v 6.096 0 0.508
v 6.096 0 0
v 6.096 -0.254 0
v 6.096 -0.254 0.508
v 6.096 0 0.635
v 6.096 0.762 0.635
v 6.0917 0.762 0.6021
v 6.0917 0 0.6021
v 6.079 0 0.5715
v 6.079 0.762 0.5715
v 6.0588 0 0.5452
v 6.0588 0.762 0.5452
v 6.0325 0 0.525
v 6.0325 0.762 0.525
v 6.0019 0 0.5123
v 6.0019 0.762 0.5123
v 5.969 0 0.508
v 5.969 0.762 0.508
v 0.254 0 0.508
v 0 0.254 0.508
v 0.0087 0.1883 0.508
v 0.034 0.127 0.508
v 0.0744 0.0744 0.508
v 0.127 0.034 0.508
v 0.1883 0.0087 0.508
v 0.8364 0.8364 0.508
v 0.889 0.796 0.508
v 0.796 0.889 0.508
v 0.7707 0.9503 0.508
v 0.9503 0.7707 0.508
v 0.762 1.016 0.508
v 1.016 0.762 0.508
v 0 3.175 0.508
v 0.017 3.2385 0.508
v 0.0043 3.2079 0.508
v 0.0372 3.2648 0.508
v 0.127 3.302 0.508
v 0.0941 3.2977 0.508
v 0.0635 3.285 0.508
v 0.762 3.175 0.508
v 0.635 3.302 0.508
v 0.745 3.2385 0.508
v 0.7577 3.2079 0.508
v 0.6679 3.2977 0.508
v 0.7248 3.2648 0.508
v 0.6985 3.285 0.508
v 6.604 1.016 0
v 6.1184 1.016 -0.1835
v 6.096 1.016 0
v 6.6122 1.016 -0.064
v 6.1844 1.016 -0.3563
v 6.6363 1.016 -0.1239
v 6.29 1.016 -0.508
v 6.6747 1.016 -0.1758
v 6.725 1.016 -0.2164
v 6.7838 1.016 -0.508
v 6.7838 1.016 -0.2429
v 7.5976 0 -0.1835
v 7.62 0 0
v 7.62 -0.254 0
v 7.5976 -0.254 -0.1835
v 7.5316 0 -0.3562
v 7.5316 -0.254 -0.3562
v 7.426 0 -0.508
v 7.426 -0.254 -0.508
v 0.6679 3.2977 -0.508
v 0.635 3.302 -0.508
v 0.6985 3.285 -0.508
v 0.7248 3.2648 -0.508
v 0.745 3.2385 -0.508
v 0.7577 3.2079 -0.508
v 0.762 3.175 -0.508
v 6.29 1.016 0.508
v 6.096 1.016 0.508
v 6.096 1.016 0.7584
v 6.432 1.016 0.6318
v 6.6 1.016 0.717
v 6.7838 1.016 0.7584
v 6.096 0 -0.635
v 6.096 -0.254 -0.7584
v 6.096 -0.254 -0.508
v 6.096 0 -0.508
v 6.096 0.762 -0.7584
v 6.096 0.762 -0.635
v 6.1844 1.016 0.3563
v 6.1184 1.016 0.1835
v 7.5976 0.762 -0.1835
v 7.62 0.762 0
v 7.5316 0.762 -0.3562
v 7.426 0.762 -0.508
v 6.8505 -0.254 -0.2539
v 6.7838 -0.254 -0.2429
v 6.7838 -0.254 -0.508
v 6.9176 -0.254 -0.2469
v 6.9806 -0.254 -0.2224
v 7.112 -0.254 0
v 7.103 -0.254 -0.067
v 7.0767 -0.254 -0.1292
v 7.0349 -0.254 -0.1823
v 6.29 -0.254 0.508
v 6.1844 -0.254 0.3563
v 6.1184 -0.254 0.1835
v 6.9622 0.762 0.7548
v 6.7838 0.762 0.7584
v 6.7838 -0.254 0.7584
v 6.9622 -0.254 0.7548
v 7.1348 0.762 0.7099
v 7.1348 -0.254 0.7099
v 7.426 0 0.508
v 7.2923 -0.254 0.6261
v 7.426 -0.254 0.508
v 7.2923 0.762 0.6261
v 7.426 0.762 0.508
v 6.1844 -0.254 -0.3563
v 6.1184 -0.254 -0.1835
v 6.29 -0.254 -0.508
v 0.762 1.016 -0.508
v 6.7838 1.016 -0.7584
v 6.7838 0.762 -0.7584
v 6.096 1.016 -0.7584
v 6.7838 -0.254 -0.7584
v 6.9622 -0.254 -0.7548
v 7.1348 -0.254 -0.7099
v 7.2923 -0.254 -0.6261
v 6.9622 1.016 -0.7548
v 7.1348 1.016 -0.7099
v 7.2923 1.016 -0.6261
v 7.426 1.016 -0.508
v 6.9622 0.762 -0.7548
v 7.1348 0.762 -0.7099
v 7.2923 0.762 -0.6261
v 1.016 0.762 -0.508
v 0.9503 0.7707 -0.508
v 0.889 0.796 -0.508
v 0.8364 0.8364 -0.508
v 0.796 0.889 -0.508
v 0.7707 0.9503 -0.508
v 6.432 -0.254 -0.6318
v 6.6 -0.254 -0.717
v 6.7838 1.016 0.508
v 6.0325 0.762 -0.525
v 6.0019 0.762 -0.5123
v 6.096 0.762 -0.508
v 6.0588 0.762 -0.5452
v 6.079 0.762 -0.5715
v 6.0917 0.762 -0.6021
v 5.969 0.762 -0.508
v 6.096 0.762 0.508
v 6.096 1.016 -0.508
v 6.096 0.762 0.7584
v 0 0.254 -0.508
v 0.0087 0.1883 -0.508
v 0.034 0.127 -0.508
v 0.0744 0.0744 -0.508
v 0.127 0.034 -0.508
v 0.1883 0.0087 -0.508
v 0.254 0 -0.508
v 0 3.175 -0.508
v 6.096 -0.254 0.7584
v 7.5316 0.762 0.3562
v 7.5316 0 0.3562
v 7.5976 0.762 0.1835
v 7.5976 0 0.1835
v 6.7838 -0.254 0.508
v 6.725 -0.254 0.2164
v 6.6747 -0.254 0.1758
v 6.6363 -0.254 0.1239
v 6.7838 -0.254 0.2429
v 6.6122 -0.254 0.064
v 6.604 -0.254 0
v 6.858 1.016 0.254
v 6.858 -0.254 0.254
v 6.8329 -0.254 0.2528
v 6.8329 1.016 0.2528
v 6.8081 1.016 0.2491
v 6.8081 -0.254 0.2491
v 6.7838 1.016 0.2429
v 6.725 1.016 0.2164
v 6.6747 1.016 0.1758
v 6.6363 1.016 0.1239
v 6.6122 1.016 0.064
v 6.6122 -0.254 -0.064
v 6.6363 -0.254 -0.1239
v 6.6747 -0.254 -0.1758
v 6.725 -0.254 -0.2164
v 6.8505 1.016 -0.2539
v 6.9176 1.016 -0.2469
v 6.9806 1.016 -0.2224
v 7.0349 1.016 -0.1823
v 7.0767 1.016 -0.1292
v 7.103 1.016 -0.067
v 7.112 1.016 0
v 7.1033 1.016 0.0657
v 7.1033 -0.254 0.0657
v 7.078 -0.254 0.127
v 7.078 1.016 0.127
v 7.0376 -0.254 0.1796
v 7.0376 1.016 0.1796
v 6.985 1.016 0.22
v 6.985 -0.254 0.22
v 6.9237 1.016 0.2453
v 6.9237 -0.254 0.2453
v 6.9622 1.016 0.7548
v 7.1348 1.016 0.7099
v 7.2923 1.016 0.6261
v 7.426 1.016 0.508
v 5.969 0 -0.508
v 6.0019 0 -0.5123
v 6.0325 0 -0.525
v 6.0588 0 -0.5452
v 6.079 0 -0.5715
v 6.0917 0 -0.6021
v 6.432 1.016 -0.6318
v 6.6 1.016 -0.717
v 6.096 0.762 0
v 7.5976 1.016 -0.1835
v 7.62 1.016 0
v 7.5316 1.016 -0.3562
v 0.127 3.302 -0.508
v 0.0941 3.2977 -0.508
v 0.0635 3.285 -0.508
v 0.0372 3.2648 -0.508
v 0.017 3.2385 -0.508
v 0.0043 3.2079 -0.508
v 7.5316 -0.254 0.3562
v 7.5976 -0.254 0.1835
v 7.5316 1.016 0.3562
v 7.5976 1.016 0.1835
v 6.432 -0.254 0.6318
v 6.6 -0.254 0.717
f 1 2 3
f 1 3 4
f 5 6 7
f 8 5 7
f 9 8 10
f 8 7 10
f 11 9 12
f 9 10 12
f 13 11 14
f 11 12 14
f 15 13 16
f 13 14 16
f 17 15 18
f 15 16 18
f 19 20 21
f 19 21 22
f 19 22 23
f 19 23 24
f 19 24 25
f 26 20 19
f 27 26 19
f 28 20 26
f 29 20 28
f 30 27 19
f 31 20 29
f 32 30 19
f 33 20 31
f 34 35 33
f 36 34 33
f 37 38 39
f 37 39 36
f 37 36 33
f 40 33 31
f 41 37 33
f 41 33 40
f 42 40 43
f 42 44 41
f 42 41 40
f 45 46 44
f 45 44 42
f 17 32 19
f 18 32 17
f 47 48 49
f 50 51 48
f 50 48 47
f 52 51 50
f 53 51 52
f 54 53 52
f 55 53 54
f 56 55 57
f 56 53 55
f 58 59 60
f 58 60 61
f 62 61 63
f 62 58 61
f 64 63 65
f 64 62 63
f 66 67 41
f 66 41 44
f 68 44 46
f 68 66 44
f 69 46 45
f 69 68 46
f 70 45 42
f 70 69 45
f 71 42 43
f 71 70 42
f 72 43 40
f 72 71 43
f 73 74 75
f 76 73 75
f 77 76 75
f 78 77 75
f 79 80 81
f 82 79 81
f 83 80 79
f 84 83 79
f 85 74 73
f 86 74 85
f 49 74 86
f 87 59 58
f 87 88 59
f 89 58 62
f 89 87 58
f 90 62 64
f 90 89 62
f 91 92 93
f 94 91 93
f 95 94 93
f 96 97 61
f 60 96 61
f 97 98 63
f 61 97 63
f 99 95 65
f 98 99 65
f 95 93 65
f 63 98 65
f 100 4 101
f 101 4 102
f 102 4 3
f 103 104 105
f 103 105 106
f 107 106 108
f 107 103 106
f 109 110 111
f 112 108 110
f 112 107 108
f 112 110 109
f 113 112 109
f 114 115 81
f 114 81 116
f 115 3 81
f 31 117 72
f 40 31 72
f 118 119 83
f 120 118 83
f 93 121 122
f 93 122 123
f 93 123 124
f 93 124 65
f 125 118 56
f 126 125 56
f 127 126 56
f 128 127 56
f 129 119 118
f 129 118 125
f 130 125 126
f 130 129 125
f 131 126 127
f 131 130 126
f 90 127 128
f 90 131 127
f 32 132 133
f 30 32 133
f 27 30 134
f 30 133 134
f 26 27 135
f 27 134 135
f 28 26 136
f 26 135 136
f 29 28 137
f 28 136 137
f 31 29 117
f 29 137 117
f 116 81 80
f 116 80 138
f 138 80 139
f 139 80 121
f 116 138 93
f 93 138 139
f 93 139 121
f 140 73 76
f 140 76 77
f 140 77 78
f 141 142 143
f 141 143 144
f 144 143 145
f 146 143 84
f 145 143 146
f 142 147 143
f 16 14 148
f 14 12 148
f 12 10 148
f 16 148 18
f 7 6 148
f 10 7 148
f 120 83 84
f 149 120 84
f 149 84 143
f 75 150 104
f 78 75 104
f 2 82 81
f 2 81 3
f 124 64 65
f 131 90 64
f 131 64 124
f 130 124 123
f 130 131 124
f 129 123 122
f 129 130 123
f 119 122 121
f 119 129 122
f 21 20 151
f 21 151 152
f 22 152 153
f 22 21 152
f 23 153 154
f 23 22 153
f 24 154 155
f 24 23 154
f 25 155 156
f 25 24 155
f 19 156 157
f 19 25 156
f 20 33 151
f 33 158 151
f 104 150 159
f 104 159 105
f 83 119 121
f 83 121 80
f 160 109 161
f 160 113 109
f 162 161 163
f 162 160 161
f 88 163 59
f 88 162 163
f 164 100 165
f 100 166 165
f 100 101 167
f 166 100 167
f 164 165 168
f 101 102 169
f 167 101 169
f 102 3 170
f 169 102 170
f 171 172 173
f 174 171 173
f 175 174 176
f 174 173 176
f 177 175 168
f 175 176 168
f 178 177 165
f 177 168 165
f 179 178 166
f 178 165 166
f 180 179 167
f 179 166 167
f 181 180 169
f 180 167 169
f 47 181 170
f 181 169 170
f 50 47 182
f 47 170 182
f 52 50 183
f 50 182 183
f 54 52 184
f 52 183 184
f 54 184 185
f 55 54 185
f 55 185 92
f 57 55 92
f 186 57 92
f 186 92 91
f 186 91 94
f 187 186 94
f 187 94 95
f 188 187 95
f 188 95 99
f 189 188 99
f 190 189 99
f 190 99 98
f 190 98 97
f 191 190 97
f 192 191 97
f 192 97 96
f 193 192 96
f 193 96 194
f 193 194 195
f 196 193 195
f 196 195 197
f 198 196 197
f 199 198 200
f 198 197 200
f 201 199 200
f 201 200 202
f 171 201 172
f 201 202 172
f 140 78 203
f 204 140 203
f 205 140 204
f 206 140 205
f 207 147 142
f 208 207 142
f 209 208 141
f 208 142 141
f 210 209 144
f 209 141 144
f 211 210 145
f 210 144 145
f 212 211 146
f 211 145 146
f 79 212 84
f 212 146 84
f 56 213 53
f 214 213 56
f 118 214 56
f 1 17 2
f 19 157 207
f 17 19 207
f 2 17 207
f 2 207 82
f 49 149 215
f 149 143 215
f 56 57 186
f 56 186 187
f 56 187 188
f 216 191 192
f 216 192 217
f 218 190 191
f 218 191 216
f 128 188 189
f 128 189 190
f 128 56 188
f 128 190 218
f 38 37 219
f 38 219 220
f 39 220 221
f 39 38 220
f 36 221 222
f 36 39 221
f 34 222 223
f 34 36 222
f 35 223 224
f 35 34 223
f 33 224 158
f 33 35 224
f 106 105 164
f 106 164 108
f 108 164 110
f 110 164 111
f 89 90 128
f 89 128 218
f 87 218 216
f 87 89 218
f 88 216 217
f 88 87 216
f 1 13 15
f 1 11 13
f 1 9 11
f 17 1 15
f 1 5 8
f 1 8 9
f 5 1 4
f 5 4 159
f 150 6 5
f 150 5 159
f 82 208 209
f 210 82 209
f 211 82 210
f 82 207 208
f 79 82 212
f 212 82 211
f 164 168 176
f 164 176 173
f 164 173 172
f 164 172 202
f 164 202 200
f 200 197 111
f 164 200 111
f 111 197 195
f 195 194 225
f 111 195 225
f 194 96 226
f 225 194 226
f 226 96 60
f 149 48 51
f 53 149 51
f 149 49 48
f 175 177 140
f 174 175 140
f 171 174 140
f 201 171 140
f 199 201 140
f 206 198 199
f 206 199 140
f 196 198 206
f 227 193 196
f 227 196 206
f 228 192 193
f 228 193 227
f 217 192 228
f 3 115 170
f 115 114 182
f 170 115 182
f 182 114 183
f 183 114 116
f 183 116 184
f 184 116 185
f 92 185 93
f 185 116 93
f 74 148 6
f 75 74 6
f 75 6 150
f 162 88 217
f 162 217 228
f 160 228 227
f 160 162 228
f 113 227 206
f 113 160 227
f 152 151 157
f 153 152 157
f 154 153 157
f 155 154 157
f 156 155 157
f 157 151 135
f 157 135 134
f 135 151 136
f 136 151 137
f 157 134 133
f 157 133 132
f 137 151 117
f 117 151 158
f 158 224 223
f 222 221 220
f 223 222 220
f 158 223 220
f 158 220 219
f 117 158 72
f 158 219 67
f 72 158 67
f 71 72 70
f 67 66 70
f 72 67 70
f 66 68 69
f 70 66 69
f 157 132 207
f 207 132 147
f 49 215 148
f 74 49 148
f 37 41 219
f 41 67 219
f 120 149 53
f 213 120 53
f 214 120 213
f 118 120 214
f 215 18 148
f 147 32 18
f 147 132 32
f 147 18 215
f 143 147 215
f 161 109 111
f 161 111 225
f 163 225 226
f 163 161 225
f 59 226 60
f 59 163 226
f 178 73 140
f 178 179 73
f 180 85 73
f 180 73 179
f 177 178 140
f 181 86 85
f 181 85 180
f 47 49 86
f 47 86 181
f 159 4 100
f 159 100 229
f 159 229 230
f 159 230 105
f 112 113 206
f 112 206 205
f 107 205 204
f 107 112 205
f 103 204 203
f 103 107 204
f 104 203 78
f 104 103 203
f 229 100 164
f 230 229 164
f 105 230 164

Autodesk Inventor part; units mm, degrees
ref_plane "YZ Plane" through (0, 0, 0) normal (1, 0, 0) x (0, 1, 0)
ref_plane "XZ Plane" through (0, 0, 0) normal (0, 1, 0) x (-1, 0, 0)
ref_plane "XY Plane" through (0, 0, 0) normal (0, 0, 1) x (1, 0, 0)
sketch "Sketch1" plane through (0, 0, 0) normal (0, 0, 1) x (1, 0, 0)
  line L0 (0, 4.0132) -> (0, -0.9652) projected
  line L1 (-1.524, 0) -> (9.144, 0) projected
  line L2 (7.62, 0) -> (0, 0)
  line L3 (0, 0) -> (0, 0.762)
  line L4 (0, 0.762) -> (7.62, 0.762)
  line L5 (7.62, 0.762) -> (7.62, 0)
  line L6 (0, 0.762) -> (0.762, 0.762)
  line L7 (0.762, 0.762) -> (0.762, 3.302)
  line L8 (0.762, 3.302) -> (0, 3.302)
  line L9 (0, 3.302) -> (0, 0.762)
  line L10 (6.096, -0.254) -> (7.62, -0.254)
  line L11 (7.62, -0.254) -> (7.62, 1.016)
  line L12 (7.62, 1.016) -> (6.096, 1.016)
  line L13 (6.096, 1.016) -> (6.096, -0.254)
  line L14 (6.096, -0.254) -> (7.62, 1.016) construction
  line L15 (7.62, -0.254) -> (6.096, 1.016) construction
  line L16 (0, 0.381) -> (7.62, 0.381) construction
  point P0 (6.858, 0.381)
  dimension "d0" = 0.762
  dimension "d1" = 0.762
  dimension "d2" = 3.302
  dimension "d4" = 1.27
  dimension "d5" = 1.524
  dimension "d6" = 6.858
  dimension "d7" = 0
extrude "Extrusion1" add sketch "Sketch1" along normal mid plane 1.016 contours L8 L7 L4 L0 | L4 L13 L1 L0 | L13 L4 L5 L1
sketch "Sketch2" plane through (0.762, 0.762, 0.508) normal (0, 1, 0) x (1, 0, 0)
  line L0 (-0.762, 1.5748) -> (-0.762, -0.5588) projected
  line L1 (8.382, 0.508) -> (-2.286, 0.508) projected
  line L2 (6.858, 1.016) -> (6.858, 0) projected
  circle A0 centre (6.096, 0.508) radius 0.762
  line L3 (0, 1.016) -> (6.858, 1.016) projected
  line L4 (6.858, 0) -> (0, 0) projected
  line L5 (6.664, 0) -> (6.858, 0)
  line L6 (6.858, 0) -> (6.858, 1.016)
  line L7 (6.858, 1.016) -> (6.664, 1.016)
  line L8 (5.334, -0.2504) -> (6.0218, -0.2504)
  line L9 (6.0218, -0.2504) -> (6.0218, 1.2664)
  line L10 (6.0218, 1.2664) -> (5.334, 1.2664)
  line L11 (5.334, 1.2664) -> (5.334, -0.2504)
  line L12 (5.334, -0.2504) -> (6.0218, 1.2664) construction
  line L13 (6.0218, -0.2504) -> (5.334, 1.2664) construction
  point P0 (-0.762, 0.508)
  point P1 (5.6779, 0.508)
  dimension "d10" = 1.524
  dimension "d30" = 6.096
extrude "Extrusion2" add sketch "Sketch2" against normal blind 1.016 and the other way blind 0.254 contours A0 L4 L9 L1 | L1 L9 L3 A0 | L9 L4 A0 L1 | L1 A0 L3 L9 | L3 L9 A0 | A0 L9 L4 | L11 L3 A0 | A0 L4 L11 | L9 A0 L4 | L3 A0 L9 | A0 L3 L11 L10 | L8 L11 L4 A0
extrude "Extrusion3" cut sketch "Sketch2" against normal up to next contours A0 L3 L2 | L2 L4 A0
hole "Hole1" at (6.858, 1.016, 0) direction (0, -1, 0) diameter 0.508 end through all
fillet "Fillet2" radius 0.254 2 edges at (0.762, 0.762, 0) (0, 0, 0)
fillet "Fillet3" radius 0.127 2 edges at (6.096, 0.381, 0.508) (6.096, 0.381, -0.508)
fillet "Fillet4" radius 0.127 2 edges at (0, 3.302, 0) (0.762, 3.302, 0)
properties part number "J007872 GRIN LENS HOLDER 0_5MM DIA Rev -" material "STAINLESS STEEL, 316"
